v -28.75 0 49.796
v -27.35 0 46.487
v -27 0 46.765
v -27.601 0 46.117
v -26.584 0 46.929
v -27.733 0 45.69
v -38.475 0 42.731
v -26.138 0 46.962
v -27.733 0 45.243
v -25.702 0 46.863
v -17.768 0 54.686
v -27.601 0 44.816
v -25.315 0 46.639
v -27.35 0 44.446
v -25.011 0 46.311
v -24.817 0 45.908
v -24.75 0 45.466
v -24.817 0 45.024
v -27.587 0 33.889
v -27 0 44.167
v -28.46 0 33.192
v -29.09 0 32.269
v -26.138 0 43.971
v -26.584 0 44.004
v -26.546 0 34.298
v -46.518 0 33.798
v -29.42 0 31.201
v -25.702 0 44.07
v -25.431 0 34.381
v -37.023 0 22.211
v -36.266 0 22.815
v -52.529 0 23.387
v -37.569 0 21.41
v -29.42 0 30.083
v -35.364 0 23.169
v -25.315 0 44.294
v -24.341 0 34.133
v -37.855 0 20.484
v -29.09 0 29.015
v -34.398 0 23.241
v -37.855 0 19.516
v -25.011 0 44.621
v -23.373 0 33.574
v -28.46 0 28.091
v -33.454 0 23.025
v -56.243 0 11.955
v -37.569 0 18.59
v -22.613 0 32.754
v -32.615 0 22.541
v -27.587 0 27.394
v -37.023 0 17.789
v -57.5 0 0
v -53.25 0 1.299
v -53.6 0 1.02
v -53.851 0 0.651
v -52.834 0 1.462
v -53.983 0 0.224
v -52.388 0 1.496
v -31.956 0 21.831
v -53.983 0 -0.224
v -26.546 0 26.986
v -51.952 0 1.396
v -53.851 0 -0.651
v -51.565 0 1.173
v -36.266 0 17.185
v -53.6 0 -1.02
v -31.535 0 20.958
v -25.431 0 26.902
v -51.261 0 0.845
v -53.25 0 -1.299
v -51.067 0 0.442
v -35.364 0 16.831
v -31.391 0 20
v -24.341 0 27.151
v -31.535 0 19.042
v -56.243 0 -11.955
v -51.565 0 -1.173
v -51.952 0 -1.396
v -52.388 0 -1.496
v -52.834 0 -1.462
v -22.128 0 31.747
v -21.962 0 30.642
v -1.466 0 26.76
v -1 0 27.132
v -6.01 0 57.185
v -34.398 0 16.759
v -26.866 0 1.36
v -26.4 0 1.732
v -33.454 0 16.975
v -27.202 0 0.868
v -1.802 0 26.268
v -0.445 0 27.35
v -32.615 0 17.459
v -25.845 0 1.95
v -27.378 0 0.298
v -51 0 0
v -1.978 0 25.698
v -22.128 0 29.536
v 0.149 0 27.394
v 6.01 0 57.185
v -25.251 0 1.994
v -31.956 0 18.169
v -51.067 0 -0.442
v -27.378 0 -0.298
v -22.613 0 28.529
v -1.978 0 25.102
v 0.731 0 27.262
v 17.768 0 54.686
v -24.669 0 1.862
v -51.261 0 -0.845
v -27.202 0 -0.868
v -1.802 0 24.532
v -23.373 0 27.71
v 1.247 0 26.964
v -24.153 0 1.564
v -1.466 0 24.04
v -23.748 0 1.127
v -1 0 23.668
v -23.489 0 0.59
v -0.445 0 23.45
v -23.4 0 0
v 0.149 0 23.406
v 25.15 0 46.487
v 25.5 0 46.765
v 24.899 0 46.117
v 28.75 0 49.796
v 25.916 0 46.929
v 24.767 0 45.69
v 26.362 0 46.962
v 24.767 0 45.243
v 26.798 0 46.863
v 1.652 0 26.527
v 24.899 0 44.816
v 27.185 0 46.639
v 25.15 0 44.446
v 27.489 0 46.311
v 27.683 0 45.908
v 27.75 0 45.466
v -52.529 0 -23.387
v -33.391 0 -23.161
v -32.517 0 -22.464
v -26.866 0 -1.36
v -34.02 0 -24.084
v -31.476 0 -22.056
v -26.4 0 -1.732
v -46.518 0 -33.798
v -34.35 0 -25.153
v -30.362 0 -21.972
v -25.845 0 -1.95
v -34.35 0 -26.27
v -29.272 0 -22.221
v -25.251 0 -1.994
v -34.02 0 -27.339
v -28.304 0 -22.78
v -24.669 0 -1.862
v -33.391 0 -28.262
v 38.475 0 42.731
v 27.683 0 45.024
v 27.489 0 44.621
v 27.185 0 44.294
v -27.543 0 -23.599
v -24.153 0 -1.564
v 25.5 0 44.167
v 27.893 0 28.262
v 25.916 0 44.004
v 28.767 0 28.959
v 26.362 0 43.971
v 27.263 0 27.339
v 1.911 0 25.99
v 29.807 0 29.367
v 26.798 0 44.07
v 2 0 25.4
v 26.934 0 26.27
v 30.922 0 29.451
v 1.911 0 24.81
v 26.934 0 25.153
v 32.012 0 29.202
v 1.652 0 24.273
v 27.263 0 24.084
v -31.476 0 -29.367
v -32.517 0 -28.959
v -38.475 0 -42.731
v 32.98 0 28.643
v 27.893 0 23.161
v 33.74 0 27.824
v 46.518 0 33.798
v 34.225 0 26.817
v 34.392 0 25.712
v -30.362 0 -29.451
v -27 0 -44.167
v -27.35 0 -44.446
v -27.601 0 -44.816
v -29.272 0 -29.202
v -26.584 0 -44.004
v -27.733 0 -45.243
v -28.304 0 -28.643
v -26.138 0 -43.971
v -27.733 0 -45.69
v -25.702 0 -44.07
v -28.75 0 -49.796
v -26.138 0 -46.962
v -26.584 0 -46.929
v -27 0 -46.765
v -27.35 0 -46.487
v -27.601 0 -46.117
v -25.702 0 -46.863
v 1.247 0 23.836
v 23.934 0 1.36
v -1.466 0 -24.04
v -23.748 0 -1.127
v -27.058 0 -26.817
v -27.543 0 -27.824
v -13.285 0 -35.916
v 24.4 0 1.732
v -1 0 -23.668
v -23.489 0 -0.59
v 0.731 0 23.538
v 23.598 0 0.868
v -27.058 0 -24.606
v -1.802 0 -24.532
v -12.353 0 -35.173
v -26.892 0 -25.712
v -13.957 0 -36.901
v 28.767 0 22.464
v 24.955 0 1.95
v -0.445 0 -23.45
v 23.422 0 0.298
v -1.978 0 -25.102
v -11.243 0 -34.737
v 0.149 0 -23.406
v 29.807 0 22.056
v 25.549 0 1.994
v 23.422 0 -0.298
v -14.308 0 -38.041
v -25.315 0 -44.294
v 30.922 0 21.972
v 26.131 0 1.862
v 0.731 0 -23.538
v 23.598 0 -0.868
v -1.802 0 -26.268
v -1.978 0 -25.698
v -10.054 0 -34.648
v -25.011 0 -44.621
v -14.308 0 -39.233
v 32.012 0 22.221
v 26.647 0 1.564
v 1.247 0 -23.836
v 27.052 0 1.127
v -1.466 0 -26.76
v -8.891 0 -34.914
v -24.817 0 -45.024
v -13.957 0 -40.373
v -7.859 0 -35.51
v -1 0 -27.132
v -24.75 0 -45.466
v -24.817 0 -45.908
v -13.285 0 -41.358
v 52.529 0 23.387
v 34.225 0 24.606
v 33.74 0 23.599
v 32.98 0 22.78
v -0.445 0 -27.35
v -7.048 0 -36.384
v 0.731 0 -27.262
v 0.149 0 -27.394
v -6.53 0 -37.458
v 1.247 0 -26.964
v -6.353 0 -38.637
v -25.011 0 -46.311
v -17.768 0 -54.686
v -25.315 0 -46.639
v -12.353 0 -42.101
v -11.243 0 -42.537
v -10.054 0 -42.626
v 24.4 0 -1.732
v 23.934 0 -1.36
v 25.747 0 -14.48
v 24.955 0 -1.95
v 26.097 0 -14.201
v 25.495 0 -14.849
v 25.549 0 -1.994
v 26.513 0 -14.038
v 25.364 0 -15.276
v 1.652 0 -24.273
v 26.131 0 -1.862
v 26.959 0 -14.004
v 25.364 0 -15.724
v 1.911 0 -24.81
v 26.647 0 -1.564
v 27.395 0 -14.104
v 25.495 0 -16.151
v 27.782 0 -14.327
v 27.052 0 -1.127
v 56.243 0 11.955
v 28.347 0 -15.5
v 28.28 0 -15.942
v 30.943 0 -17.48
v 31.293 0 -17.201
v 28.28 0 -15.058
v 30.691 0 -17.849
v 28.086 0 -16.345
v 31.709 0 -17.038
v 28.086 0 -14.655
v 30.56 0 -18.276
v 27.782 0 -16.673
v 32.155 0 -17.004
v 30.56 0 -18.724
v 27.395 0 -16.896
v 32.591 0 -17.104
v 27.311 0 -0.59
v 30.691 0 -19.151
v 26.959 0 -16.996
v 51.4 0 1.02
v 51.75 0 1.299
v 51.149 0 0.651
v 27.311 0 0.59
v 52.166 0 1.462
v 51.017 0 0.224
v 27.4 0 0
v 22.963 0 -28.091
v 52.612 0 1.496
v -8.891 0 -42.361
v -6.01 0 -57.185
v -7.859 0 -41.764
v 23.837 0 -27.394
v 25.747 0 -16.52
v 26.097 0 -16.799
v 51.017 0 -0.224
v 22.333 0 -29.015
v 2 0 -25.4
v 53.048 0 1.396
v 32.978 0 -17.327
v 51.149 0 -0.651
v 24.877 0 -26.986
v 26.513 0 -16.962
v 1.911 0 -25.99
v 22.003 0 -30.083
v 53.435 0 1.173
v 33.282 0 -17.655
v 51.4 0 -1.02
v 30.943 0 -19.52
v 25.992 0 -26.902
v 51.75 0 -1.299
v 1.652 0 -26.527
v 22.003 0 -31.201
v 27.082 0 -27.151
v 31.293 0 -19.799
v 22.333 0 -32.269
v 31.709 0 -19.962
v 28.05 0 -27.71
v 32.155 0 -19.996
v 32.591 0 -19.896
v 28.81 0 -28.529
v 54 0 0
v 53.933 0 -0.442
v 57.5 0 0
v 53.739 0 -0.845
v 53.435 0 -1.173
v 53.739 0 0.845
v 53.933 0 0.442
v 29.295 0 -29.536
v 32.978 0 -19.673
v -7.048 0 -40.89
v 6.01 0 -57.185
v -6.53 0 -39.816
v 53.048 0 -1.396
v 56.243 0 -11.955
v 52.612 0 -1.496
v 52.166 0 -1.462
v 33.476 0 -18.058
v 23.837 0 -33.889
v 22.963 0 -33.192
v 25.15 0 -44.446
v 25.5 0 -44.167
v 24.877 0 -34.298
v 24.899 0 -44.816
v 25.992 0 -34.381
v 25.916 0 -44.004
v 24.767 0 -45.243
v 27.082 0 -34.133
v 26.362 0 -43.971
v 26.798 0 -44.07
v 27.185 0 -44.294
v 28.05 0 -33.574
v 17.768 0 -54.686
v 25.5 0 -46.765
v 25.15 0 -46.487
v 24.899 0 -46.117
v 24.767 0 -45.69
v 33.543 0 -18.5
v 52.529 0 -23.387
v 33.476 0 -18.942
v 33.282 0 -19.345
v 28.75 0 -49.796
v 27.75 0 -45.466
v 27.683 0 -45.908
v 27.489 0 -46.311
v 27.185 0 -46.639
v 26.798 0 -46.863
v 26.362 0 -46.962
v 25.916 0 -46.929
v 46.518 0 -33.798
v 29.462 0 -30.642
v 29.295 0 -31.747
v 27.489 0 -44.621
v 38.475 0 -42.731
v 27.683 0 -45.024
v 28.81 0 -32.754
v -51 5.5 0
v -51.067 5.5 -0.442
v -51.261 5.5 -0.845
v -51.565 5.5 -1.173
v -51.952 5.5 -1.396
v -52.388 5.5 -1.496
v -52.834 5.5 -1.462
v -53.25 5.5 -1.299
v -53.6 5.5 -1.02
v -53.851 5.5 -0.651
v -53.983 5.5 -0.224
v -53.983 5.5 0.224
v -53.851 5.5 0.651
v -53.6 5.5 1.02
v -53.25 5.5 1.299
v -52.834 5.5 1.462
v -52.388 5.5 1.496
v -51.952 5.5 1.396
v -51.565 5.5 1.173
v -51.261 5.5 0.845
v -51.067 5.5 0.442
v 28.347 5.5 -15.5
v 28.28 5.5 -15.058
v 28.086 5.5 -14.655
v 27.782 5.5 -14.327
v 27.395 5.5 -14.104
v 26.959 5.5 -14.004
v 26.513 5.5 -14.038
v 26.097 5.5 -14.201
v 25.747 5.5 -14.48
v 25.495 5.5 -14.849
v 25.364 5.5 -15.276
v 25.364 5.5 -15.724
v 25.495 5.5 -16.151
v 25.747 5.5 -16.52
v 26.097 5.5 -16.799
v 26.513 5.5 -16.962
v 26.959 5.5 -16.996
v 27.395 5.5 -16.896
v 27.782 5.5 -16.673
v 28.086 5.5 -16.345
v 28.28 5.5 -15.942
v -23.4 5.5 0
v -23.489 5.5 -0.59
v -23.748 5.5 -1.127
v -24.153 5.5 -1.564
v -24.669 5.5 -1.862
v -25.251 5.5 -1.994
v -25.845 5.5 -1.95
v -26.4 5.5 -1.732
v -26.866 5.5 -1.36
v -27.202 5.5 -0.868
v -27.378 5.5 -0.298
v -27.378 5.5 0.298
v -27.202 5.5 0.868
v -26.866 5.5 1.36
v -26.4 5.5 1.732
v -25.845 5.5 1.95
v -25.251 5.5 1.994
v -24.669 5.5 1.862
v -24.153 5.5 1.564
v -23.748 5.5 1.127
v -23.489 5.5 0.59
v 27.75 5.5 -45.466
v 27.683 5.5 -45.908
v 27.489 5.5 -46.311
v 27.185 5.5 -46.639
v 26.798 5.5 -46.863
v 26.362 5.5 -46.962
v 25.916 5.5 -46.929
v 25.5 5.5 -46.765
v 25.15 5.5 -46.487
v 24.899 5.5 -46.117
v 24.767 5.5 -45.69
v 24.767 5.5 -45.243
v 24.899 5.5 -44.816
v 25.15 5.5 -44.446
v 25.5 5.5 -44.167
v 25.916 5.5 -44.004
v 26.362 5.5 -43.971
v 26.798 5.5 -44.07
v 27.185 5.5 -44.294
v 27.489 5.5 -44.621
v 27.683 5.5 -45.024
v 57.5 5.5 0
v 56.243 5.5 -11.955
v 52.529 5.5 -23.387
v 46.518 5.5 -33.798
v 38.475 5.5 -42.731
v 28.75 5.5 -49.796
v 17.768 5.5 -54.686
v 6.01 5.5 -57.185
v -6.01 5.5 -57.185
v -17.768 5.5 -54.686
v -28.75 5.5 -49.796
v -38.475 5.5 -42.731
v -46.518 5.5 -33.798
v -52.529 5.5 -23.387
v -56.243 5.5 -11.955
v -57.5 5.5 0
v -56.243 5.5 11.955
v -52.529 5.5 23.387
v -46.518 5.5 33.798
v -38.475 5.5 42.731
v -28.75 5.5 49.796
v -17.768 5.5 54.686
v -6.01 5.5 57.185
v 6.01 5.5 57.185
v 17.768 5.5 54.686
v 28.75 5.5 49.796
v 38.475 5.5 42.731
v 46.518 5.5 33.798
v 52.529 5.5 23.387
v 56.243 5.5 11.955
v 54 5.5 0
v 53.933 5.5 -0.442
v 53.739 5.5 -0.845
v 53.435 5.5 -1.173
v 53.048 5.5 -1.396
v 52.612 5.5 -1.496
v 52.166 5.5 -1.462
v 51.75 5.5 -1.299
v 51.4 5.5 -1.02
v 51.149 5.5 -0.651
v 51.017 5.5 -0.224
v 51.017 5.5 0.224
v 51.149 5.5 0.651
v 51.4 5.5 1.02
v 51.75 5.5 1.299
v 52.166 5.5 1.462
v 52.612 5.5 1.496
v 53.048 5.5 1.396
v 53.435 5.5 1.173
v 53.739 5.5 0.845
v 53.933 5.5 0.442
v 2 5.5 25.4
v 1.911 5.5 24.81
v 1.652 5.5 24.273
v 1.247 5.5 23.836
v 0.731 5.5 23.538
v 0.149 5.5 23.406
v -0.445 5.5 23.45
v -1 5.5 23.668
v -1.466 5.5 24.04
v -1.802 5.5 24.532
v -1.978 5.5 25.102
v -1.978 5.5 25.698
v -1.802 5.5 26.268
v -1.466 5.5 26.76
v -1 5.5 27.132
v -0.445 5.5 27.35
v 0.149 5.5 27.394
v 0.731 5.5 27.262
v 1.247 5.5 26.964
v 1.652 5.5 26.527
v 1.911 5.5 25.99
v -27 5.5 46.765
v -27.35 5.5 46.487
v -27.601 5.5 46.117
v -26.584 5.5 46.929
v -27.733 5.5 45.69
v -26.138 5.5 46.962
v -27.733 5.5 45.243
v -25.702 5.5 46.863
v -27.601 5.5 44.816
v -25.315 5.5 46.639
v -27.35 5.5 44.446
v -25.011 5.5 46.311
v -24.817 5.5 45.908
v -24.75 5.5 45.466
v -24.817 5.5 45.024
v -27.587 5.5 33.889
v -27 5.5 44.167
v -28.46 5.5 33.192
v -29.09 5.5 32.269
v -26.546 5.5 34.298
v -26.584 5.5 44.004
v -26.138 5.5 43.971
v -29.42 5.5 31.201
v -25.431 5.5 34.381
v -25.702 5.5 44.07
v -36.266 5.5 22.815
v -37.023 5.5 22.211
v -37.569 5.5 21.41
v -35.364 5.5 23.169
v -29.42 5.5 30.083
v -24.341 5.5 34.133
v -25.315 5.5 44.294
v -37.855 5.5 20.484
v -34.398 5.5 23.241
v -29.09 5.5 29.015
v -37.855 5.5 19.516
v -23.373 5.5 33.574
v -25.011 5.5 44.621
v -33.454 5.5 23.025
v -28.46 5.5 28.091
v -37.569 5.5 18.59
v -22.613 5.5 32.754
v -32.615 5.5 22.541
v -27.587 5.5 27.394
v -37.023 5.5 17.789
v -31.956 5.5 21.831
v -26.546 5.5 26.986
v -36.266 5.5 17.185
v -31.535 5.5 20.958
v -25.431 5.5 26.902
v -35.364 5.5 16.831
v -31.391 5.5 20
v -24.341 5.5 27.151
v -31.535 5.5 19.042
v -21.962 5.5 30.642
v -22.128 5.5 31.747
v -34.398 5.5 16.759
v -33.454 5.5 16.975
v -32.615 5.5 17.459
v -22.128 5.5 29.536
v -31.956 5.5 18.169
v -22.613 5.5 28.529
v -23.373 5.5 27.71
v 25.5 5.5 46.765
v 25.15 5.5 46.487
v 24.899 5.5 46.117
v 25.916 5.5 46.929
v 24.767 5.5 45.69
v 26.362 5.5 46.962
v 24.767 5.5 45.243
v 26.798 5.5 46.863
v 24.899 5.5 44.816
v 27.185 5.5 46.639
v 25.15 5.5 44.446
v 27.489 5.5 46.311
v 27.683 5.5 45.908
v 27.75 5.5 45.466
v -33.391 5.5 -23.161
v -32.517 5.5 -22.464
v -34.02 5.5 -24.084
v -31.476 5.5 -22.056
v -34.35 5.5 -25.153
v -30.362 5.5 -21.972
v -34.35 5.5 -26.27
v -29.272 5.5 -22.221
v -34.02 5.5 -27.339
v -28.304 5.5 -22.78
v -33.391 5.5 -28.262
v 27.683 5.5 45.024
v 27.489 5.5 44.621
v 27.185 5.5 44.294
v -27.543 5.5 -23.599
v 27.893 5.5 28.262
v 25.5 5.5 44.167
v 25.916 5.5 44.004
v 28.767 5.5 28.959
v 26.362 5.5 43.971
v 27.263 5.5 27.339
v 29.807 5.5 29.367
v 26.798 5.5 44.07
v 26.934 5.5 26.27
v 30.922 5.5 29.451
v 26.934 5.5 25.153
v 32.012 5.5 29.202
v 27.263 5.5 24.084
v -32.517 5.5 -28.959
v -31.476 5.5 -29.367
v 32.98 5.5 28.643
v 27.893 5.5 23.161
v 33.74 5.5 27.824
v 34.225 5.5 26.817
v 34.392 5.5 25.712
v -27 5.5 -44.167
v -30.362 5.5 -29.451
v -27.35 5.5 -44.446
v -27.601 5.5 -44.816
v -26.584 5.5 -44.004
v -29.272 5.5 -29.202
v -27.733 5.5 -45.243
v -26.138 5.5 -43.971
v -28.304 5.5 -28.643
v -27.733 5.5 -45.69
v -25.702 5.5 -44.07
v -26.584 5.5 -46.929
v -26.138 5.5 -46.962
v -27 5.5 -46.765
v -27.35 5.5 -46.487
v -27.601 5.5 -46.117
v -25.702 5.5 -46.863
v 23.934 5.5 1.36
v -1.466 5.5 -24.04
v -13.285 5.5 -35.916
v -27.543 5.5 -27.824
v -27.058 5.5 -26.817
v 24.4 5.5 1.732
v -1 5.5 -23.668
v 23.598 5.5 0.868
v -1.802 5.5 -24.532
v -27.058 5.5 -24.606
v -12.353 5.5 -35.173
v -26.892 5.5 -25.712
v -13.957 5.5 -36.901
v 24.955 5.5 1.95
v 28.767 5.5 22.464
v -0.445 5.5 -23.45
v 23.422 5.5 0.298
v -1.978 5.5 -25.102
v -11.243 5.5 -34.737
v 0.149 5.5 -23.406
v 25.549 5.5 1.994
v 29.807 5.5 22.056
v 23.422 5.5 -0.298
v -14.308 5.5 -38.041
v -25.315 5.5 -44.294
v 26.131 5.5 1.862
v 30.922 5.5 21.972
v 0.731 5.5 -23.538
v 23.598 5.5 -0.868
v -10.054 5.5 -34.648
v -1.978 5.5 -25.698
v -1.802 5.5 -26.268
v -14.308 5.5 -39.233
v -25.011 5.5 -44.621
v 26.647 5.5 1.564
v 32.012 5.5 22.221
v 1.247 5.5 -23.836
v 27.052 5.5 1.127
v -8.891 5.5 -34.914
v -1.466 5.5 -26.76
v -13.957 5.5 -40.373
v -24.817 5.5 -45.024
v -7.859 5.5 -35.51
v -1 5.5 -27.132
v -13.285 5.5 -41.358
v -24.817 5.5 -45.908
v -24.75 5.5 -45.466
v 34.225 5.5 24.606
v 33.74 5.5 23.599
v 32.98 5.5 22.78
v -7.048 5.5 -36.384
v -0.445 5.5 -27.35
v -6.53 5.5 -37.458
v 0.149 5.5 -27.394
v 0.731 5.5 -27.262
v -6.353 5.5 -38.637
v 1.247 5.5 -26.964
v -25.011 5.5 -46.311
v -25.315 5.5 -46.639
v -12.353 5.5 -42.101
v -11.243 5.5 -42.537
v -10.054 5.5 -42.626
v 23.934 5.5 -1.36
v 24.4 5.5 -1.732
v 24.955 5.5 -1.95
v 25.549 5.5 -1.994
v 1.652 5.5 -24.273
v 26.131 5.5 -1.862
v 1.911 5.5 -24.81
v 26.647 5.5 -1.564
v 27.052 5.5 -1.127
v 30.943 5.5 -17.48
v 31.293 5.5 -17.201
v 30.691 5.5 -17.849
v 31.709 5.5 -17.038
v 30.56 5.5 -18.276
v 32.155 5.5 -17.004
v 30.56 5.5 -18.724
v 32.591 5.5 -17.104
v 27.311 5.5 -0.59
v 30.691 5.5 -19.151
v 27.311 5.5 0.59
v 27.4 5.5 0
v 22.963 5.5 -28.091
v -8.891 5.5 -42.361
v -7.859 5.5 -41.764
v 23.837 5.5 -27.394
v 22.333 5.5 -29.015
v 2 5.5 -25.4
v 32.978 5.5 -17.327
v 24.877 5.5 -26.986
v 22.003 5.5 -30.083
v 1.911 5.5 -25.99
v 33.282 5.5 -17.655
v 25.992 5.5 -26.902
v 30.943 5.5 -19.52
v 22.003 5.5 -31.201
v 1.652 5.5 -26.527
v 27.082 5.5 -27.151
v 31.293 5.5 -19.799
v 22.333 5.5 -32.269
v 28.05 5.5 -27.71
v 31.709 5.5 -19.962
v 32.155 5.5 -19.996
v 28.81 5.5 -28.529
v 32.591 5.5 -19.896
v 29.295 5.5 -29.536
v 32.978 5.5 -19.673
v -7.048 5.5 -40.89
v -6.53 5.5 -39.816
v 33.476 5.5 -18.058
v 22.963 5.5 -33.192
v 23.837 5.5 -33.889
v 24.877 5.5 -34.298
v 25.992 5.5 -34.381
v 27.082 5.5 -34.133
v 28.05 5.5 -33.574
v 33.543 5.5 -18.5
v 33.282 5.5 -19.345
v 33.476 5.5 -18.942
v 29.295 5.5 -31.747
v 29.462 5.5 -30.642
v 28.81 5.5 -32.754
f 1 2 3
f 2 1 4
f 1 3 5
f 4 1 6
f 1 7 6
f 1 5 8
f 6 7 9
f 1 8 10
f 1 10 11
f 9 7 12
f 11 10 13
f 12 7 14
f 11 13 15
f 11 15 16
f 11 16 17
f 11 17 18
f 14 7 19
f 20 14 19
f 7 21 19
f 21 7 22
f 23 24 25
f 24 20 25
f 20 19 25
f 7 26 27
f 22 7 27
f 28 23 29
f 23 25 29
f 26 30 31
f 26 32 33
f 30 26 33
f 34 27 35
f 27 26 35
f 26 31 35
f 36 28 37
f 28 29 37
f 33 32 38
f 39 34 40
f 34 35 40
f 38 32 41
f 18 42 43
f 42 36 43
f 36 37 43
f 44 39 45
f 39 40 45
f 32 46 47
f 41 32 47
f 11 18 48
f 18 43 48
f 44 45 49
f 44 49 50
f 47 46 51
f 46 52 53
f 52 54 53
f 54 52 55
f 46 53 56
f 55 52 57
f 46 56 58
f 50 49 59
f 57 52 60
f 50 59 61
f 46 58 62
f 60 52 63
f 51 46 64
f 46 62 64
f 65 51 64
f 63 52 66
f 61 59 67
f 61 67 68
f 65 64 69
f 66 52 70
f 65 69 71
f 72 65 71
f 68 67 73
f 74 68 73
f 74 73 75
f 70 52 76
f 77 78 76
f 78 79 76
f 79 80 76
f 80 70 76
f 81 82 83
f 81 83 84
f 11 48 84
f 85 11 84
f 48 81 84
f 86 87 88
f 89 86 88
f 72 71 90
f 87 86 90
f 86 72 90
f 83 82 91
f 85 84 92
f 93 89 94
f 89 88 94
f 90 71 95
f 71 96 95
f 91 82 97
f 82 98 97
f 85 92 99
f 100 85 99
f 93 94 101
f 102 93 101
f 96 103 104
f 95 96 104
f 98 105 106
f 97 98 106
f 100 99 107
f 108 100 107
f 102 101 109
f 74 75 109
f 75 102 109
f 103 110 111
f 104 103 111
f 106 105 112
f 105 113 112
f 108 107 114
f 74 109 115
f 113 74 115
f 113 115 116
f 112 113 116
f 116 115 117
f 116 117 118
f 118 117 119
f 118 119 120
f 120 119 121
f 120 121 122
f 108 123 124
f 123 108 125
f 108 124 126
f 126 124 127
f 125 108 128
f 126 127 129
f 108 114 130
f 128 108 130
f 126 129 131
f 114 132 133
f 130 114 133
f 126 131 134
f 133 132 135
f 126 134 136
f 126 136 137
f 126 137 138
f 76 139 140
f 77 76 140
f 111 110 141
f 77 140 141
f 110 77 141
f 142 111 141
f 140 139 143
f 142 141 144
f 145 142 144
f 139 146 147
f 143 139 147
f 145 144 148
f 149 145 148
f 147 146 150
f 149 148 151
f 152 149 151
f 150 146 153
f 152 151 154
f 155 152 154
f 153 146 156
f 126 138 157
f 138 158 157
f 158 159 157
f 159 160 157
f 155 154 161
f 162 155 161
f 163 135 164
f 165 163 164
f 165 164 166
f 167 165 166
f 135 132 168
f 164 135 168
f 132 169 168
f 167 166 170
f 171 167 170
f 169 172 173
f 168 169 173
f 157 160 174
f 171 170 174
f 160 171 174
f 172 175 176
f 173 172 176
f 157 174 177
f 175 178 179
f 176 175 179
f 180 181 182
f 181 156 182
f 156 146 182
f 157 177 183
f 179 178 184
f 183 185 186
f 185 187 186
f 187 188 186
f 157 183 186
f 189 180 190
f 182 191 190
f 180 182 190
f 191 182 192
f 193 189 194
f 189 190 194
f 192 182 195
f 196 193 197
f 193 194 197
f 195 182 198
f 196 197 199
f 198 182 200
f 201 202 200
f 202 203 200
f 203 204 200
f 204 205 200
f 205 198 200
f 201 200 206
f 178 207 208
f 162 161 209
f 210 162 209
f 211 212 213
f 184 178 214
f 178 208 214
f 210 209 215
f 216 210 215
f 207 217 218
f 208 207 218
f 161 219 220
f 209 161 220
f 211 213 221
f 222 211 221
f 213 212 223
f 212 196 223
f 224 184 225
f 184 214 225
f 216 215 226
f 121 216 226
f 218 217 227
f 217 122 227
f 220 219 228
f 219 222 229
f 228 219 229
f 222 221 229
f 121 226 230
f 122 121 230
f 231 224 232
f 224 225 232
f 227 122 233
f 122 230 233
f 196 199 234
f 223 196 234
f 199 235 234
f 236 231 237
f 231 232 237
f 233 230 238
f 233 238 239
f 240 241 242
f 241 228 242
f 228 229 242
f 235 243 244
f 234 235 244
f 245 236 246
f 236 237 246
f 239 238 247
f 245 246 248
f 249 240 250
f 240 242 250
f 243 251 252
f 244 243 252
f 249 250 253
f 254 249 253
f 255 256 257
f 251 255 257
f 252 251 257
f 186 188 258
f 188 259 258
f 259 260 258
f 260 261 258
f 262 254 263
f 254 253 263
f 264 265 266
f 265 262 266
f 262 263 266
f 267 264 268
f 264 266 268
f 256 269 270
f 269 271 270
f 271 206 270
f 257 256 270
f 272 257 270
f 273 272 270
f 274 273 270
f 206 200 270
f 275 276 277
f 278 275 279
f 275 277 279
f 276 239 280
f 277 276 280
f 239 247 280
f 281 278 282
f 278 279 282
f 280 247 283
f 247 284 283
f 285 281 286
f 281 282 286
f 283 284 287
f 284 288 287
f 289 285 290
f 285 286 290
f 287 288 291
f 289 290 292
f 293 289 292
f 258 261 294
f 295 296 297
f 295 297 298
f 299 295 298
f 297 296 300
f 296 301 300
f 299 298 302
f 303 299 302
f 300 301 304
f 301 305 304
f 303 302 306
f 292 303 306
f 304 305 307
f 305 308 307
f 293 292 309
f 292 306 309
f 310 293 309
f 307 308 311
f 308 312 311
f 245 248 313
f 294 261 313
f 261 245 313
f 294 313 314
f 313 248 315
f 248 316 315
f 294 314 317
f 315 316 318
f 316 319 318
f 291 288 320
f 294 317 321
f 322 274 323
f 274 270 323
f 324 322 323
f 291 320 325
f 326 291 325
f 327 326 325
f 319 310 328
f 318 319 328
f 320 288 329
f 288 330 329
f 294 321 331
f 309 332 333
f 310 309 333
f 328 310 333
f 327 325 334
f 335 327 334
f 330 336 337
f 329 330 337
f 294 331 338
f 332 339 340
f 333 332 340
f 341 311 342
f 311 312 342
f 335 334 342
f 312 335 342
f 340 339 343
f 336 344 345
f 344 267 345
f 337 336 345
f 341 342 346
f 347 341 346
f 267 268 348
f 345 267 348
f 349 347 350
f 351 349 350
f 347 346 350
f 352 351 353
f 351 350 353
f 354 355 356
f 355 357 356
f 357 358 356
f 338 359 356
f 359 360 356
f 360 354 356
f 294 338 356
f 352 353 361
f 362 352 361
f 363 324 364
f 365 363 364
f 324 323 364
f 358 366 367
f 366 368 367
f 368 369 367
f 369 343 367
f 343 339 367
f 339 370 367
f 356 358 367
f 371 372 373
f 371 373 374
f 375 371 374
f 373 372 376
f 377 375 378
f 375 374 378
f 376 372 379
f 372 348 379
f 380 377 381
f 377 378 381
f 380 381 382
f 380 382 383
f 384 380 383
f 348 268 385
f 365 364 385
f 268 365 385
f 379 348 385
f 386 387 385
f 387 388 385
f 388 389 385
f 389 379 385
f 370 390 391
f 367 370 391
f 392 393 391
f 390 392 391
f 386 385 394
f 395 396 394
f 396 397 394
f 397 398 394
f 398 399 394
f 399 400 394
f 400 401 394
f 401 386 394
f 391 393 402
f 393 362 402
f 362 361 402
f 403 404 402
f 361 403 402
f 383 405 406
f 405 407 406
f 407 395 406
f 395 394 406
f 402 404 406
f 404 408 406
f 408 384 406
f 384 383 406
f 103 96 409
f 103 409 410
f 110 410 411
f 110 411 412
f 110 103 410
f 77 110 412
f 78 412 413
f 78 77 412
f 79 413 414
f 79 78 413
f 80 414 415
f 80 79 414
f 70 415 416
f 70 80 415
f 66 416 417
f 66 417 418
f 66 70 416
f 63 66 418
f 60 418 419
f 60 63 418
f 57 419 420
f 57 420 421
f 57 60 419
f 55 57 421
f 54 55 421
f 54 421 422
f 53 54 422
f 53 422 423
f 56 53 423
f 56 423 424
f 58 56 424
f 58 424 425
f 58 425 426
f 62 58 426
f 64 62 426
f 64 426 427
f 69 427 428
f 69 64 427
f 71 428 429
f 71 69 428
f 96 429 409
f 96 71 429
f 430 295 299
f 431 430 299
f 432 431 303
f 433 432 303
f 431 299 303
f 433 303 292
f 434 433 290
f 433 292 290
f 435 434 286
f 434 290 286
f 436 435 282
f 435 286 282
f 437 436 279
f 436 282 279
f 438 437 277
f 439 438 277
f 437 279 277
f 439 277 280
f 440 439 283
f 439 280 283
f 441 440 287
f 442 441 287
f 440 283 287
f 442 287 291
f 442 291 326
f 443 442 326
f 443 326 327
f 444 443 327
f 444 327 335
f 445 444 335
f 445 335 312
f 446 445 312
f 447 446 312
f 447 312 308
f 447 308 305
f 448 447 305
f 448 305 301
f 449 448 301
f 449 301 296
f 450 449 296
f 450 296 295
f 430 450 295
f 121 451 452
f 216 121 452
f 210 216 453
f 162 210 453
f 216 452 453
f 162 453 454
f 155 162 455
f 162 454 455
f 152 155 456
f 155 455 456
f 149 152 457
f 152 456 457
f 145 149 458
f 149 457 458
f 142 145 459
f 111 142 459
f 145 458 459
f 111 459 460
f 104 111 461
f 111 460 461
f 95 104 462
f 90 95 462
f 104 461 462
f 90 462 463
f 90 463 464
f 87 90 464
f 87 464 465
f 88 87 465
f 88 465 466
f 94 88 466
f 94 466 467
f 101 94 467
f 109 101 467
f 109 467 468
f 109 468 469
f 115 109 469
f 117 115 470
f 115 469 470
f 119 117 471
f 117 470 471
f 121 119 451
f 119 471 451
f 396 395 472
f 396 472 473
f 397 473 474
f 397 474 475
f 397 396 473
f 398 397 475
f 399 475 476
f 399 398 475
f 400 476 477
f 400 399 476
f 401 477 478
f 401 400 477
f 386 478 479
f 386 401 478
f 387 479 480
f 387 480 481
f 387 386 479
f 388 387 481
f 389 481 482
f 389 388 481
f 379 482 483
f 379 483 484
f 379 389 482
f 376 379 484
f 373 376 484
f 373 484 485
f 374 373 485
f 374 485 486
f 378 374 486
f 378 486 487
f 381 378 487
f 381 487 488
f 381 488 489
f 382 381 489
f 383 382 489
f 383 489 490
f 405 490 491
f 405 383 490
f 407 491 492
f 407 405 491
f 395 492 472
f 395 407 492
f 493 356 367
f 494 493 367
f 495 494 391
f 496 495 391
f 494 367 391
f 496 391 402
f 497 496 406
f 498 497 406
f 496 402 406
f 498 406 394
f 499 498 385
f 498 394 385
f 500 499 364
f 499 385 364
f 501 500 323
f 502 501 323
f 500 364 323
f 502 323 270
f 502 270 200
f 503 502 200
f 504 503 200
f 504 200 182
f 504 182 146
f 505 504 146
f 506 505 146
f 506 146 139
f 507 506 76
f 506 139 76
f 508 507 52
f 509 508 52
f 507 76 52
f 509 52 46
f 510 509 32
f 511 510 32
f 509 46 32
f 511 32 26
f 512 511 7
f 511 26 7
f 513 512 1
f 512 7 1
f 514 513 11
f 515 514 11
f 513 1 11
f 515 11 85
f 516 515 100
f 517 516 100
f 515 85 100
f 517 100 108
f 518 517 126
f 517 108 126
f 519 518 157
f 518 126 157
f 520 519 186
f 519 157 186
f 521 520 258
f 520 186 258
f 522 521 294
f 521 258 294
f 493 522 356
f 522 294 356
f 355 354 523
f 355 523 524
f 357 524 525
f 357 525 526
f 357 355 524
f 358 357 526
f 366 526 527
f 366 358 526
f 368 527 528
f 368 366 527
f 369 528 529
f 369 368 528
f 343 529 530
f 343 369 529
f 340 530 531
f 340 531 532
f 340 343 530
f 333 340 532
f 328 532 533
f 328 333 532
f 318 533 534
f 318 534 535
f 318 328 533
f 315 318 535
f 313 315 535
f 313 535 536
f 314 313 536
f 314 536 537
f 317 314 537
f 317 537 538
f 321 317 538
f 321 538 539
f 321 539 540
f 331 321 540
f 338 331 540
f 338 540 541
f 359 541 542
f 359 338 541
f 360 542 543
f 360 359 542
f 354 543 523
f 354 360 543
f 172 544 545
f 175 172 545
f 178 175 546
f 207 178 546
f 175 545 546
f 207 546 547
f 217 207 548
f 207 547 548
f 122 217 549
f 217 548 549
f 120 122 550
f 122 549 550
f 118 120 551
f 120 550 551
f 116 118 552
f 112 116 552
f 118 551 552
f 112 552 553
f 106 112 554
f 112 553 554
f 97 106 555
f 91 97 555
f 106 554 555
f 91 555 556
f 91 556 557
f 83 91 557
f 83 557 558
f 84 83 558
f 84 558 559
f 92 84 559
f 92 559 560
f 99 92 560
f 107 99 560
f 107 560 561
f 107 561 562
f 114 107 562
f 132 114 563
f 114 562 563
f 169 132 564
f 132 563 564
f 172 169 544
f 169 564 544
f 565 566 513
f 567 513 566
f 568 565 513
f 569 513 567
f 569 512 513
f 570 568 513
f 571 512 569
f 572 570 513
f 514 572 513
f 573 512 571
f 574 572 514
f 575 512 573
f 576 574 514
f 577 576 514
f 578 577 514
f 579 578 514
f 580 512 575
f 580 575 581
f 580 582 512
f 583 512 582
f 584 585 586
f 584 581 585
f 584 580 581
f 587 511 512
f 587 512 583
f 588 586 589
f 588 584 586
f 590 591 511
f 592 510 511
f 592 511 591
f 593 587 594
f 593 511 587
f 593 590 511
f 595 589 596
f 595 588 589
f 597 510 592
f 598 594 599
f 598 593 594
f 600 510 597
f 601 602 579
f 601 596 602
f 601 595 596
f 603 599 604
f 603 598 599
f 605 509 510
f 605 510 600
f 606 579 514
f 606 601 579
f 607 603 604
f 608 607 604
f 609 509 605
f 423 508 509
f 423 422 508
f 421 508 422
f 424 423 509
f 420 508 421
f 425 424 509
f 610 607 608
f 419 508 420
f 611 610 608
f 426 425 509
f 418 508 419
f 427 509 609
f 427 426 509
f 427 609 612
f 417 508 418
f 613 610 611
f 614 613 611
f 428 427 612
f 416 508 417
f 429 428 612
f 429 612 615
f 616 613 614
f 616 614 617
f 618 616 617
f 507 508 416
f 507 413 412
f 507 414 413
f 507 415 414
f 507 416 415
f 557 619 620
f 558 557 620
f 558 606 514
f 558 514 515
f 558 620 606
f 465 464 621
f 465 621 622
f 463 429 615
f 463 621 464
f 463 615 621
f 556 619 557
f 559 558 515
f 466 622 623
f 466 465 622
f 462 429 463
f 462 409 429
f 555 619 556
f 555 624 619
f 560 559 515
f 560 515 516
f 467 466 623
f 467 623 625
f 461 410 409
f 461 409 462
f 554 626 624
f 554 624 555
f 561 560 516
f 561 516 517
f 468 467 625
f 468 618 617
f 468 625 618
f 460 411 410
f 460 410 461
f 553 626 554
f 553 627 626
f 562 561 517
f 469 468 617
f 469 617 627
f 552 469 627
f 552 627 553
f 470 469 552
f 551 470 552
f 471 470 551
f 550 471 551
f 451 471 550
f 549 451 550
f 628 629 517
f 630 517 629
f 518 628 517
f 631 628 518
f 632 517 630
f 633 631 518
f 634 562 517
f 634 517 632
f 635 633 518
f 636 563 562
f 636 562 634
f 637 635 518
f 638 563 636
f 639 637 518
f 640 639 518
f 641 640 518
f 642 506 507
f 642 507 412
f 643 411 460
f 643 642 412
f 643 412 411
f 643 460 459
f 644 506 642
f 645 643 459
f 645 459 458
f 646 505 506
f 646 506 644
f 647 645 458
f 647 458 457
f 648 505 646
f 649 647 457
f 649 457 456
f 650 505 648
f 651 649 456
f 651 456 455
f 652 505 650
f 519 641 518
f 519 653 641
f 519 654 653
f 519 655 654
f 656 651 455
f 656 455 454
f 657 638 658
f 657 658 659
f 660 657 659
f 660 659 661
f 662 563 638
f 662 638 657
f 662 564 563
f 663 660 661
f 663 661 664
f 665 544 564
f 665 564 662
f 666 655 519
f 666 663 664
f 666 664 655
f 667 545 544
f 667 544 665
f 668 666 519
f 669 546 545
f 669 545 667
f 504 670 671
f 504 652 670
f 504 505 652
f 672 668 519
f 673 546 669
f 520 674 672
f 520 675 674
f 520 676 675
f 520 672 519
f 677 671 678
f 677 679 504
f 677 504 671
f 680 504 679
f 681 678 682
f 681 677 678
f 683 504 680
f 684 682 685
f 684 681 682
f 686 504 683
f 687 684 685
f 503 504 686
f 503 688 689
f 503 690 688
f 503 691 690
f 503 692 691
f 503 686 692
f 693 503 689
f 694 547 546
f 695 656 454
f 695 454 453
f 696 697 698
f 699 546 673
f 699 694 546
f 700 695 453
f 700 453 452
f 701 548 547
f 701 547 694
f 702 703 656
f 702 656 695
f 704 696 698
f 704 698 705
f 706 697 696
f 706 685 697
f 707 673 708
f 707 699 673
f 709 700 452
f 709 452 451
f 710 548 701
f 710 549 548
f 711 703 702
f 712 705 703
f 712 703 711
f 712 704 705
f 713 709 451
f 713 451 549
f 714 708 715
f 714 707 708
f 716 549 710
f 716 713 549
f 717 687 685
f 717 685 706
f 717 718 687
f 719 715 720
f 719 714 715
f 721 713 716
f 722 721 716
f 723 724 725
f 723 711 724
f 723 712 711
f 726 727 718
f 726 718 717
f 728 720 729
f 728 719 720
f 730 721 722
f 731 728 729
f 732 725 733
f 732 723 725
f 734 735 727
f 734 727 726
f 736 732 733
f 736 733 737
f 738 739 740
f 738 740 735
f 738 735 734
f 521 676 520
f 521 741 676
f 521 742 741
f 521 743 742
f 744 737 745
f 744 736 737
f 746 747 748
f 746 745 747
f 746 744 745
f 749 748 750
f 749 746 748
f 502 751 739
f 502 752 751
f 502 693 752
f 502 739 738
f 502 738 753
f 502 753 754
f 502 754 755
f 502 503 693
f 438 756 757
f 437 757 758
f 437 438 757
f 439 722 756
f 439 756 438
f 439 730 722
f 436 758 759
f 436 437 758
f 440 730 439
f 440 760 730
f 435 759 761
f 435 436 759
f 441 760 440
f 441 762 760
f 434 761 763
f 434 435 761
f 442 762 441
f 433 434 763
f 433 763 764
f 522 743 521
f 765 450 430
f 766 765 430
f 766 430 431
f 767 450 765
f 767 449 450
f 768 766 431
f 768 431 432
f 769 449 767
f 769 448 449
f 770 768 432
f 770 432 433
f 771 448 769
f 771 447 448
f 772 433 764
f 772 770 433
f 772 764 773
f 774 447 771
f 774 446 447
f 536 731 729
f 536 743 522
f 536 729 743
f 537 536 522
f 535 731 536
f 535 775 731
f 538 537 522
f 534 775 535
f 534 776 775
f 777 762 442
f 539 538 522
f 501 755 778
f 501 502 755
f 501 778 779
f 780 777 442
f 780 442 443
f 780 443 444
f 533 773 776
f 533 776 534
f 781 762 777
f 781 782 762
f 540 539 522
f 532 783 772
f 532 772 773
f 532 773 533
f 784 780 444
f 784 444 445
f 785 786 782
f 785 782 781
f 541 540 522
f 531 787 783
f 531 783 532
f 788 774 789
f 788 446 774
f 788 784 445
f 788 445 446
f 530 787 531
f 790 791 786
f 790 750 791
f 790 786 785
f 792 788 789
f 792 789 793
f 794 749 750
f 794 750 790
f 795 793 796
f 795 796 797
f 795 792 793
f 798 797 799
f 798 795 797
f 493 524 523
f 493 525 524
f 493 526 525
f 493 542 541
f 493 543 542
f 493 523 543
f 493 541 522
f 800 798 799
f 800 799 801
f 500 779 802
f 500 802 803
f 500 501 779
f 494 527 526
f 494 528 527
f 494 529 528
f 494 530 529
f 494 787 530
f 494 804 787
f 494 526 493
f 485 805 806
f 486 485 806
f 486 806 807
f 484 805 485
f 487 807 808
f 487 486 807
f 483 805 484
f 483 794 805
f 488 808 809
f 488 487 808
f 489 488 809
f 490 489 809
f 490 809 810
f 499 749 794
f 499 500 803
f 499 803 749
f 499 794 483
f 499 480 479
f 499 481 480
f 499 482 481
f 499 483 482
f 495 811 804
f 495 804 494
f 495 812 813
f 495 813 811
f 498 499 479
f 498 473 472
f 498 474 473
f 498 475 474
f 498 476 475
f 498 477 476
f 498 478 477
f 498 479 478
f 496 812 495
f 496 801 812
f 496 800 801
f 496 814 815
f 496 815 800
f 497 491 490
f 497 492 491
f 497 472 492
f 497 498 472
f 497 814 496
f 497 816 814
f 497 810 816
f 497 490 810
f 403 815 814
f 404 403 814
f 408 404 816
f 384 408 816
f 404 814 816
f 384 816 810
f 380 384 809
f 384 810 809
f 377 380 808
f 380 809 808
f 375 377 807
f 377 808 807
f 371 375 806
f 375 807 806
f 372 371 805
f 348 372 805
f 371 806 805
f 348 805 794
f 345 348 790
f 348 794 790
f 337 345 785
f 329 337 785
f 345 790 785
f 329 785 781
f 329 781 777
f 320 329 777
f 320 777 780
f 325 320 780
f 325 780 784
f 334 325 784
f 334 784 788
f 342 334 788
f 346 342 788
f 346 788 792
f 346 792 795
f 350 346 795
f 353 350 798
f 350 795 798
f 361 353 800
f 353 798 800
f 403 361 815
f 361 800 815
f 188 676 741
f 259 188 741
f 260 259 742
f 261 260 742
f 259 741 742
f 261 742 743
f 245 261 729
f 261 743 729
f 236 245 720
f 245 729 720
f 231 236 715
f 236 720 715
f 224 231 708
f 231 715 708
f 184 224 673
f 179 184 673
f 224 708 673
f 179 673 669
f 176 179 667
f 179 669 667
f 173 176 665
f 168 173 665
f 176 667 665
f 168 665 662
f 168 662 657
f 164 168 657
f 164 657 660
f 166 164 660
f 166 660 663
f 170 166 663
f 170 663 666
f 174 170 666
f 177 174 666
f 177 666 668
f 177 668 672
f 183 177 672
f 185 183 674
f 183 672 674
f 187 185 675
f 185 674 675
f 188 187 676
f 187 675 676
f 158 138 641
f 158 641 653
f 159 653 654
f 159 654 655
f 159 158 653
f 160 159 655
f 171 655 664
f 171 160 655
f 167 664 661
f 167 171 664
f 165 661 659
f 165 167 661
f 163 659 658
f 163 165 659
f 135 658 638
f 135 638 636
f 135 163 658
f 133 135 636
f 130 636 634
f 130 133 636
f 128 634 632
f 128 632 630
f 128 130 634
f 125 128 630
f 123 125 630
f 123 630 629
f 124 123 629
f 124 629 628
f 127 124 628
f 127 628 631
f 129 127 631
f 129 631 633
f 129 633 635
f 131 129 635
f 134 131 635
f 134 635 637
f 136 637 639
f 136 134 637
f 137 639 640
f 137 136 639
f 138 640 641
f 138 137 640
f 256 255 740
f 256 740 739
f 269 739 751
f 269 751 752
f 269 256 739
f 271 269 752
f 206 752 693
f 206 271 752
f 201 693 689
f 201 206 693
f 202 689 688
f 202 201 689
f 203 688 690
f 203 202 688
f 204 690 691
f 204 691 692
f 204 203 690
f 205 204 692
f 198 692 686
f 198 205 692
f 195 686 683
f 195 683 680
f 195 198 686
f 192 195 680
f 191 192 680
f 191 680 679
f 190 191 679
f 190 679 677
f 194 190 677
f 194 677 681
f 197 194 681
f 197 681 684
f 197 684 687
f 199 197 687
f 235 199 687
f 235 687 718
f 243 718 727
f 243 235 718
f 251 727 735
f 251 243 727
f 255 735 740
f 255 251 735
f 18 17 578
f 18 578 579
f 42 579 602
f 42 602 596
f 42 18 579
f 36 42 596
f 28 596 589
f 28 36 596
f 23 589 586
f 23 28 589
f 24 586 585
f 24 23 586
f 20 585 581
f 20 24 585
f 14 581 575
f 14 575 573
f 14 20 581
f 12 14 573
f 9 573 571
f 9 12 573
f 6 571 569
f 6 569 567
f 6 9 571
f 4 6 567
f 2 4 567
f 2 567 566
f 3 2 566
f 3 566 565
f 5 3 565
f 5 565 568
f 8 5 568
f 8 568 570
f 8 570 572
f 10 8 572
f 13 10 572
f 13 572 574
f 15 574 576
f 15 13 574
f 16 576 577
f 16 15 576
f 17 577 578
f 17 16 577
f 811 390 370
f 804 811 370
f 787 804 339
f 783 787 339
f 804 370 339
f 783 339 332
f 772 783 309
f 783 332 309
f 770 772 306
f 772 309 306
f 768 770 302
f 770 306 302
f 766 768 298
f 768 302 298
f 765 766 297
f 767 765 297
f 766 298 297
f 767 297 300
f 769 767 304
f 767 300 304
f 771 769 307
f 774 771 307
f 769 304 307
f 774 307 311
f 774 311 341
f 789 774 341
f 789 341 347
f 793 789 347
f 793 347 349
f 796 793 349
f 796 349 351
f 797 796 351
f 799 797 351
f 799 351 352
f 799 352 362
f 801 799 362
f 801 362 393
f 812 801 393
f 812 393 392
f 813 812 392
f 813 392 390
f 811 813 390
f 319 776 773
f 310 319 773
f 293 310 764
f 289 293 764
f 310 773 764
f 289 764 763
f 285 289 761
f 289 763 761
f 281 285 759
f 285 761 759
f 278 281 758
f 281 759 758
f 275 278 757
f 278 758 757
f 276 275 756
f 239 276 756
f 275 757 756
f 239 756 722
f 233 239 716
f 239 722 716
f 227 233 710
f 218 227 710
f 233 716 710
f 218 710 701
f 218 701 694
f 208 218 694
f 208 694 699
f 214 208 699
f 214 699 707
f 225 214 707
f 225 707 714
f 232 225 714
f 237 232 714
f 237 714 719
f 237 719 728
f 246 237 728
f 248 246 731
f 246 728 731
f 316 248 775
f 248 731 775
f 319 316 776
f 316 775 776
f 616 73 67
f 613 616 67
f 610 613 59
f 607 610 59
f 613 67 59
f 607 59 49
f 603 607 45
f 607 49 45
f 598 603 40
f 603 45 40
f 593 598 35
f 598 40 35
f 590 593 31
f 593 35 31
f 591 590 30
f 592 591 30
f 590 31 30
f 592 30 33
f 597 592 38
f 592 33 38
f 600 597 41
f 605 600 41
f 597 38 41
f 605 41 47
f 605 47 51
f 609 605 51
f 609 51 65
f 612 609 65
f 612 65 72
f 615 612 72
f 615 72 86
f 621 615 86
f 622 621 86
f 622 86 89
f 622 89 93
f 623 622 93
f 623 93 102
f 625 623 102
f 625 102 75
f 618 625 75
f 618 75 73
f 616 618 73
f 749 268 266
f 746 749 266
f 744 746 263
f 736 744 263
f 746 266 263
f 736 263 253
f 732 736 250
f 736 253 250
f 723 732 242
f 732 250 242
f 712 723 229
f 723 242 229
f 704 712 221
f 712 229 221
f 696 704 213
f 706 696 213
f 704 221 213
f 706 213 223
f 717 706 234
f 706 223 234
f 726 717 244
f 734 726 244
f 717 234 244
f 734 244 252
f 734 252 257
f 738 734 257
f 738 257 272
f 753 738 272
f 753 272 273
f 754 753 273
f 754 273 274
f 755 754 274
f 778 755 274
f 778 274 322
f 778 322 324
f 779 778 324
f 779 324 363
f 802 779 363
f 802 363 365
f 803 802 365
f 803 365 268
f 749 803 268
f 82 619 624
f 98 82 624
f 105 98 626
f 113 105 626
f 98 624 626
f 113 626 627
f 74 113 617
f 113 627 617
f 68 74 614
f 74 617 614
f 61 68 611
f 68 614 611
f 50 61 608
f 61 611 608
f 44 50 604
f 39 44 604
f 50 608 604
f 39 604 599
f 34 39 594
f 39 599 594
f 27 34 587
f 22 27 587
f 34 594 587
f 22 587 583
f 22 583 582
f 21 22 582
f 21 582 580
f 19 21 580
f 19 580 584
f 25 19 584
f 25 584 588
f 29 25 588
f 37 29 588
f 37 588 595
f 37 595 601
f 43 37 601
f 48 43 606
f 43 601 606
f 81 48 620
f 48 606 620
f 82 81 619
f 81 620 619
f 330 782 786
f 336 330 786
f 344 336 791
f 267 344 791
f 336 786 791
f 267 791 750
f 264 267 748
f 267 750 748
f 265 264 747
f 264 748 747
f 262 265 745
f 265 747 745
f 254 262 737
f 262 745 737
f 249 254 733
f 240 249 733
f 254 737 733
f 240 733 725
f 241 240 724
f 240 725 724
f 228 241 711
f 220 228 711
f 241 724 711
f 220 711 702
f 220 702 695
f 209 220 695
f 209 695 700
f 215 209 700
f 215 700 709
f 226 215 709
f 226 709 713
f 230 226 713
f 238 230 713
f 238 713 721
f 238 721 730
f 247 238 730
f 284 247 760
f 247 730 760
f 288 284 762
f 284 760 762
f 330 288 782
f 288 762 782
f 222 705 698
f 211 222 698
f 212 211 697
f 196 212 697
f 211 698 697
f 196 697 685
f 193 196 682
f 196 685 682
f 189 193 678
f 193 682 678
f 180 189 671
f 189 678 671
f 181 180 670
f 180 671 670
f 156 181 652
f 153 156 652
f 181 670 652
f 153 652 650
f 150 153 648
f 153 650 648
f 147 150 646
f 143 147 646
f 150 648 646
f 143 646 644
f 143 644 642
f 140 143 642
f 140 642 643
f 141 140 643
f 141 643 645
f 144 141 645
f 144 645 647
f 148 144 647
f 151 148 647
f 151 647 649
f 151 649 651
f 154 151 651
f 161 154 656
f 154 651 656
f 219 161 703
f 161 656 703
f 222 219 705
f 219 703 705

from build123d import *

# Parameters (mm, degrees)
SKETCH1_R           = 57.5
SKETCH1_R_2         = 1.5
BOSS_EXTRUDE1_DEPTH = 5.5
SKETCH3_R           = 2
CUT_EXTRUDE1_DEPTH  = 5.5
SKETCH4_R           = 3.75
CUT_EXTRUDE3_DEPTH  = 5.5
SKETCH5_R           = 3.25
CUT_EXTRUDE4_DEPTH  = 10
SKETCH6_R           = 4
SKETCH6_R_2         = 1.5
CUT_EXTRUDE5_DEPTH  = 10


with BuildPart() as part:
    # Sketch1 → Boss-Extrude1 (new body)
    with BuildSketch(Plane(origin=(0, 0, 0), x_dir=(1, 0, 0), z_dir=(0, 1, 0))):
        Circle(SKETCH1_R)
        with Locations((-52.5, 0)):
            Circle(SKETCH1_R_2, mode=Mode.SUBTRACT)
        with Locations((-26.25, 45.466333699)):
            Circle(SKETCH1_R_2, mode=Mode.SUBTRACT)
        with Locations((26.25, 45.466333699)):
            Circle(SKETCH1_R_2, mode=Mode.SUBTRACT)
        with Locations((52.5, 0)):
            Circle(SKETCH1_R_2, mode=Mode.SUBTRACT)
        with Locations((26.25, -45.466333699)):
            Circle(SKETCH1_R_2, mode=Mode.SUBTRACT)
        with Locations((-26.25, -45.466333699)):
            Circle(SKETCH1_R_2, mode=Mode.SUBTRACT)
    extrude(amount=BOSS_EXTRUDE1_DEPTH)

    # Sketch3 → Cut-Extrude1 (cut)
    with BuildSketch(Plane(origin=(0, 5.5, 0), x_dir=(1, 0, 0), z_dir=(0, 1, 0))):
        with Locations((0, 25.4)):
            Circle(SKETCH3_R)
        with Locations((25.4, 0)):
            Circle(SKETCH3_R)
        with Locations((0, -25.4)):
            Circle(SKETCH3_R)
        with Locations((-25.4, 0)):
            Circle(SKETCH3_R)
    extrude(amount=-CUT_EXTRUDE1_DEPTH, mode=Mode.SUBTRACT)

    # Sketch4 → Cut-Extrude3 (cut)
    with BuildSketch(Plane(origin=(0, 5.5, 0), x_dir=(1, 0, 0), z_dir=(0, 1, 0))):
        with Locations((-30.641777725, 25.711504387)):
            Circle(SKETCH4_R)
        with Locations((25.711504387, 30.641777725)):
            Circle(SKETCH4_R)
        with Locations((30.641777725, -25.711504387)):
            Circle(SKETCH4_R)
        with Locations((-25.711504387, -30.641777725)):
            Circle(SKETCH4_R)
    extrude(amount=-CUT_EXTRUDE3_DEPTH, mode=Mode.SUBTRACT)

    # Sketch5 → Cut-Extrude4 (cut)
    with BuildSketch(Plane.XZ):
        with Locations((-34.641016151, 20)):
            Circle(SKETCH5_R)
    extrude(amount=-CUT_EXTRUDE4_DEPTH, mode=Mode.SUBTRACT)

    # Sketch6 → Cut-Extrude5 (cut)
    with BuildSketch(Plane.XZ):
        with Locations((-10.352761804, -38.637033052)):
            Circle(SKETCH6_R)
        with Locations((32.04293994, -18.5)):
            Circle(SKETCH6_R_2)
        with Locations((26.846787517, -15.5)):
            Circle(SKETCH6_R_2)
    extrude(amount=-CUT_EXTRUDE5_DEPTH, mode=Mode.SUBTRACT)


solid = part.part
